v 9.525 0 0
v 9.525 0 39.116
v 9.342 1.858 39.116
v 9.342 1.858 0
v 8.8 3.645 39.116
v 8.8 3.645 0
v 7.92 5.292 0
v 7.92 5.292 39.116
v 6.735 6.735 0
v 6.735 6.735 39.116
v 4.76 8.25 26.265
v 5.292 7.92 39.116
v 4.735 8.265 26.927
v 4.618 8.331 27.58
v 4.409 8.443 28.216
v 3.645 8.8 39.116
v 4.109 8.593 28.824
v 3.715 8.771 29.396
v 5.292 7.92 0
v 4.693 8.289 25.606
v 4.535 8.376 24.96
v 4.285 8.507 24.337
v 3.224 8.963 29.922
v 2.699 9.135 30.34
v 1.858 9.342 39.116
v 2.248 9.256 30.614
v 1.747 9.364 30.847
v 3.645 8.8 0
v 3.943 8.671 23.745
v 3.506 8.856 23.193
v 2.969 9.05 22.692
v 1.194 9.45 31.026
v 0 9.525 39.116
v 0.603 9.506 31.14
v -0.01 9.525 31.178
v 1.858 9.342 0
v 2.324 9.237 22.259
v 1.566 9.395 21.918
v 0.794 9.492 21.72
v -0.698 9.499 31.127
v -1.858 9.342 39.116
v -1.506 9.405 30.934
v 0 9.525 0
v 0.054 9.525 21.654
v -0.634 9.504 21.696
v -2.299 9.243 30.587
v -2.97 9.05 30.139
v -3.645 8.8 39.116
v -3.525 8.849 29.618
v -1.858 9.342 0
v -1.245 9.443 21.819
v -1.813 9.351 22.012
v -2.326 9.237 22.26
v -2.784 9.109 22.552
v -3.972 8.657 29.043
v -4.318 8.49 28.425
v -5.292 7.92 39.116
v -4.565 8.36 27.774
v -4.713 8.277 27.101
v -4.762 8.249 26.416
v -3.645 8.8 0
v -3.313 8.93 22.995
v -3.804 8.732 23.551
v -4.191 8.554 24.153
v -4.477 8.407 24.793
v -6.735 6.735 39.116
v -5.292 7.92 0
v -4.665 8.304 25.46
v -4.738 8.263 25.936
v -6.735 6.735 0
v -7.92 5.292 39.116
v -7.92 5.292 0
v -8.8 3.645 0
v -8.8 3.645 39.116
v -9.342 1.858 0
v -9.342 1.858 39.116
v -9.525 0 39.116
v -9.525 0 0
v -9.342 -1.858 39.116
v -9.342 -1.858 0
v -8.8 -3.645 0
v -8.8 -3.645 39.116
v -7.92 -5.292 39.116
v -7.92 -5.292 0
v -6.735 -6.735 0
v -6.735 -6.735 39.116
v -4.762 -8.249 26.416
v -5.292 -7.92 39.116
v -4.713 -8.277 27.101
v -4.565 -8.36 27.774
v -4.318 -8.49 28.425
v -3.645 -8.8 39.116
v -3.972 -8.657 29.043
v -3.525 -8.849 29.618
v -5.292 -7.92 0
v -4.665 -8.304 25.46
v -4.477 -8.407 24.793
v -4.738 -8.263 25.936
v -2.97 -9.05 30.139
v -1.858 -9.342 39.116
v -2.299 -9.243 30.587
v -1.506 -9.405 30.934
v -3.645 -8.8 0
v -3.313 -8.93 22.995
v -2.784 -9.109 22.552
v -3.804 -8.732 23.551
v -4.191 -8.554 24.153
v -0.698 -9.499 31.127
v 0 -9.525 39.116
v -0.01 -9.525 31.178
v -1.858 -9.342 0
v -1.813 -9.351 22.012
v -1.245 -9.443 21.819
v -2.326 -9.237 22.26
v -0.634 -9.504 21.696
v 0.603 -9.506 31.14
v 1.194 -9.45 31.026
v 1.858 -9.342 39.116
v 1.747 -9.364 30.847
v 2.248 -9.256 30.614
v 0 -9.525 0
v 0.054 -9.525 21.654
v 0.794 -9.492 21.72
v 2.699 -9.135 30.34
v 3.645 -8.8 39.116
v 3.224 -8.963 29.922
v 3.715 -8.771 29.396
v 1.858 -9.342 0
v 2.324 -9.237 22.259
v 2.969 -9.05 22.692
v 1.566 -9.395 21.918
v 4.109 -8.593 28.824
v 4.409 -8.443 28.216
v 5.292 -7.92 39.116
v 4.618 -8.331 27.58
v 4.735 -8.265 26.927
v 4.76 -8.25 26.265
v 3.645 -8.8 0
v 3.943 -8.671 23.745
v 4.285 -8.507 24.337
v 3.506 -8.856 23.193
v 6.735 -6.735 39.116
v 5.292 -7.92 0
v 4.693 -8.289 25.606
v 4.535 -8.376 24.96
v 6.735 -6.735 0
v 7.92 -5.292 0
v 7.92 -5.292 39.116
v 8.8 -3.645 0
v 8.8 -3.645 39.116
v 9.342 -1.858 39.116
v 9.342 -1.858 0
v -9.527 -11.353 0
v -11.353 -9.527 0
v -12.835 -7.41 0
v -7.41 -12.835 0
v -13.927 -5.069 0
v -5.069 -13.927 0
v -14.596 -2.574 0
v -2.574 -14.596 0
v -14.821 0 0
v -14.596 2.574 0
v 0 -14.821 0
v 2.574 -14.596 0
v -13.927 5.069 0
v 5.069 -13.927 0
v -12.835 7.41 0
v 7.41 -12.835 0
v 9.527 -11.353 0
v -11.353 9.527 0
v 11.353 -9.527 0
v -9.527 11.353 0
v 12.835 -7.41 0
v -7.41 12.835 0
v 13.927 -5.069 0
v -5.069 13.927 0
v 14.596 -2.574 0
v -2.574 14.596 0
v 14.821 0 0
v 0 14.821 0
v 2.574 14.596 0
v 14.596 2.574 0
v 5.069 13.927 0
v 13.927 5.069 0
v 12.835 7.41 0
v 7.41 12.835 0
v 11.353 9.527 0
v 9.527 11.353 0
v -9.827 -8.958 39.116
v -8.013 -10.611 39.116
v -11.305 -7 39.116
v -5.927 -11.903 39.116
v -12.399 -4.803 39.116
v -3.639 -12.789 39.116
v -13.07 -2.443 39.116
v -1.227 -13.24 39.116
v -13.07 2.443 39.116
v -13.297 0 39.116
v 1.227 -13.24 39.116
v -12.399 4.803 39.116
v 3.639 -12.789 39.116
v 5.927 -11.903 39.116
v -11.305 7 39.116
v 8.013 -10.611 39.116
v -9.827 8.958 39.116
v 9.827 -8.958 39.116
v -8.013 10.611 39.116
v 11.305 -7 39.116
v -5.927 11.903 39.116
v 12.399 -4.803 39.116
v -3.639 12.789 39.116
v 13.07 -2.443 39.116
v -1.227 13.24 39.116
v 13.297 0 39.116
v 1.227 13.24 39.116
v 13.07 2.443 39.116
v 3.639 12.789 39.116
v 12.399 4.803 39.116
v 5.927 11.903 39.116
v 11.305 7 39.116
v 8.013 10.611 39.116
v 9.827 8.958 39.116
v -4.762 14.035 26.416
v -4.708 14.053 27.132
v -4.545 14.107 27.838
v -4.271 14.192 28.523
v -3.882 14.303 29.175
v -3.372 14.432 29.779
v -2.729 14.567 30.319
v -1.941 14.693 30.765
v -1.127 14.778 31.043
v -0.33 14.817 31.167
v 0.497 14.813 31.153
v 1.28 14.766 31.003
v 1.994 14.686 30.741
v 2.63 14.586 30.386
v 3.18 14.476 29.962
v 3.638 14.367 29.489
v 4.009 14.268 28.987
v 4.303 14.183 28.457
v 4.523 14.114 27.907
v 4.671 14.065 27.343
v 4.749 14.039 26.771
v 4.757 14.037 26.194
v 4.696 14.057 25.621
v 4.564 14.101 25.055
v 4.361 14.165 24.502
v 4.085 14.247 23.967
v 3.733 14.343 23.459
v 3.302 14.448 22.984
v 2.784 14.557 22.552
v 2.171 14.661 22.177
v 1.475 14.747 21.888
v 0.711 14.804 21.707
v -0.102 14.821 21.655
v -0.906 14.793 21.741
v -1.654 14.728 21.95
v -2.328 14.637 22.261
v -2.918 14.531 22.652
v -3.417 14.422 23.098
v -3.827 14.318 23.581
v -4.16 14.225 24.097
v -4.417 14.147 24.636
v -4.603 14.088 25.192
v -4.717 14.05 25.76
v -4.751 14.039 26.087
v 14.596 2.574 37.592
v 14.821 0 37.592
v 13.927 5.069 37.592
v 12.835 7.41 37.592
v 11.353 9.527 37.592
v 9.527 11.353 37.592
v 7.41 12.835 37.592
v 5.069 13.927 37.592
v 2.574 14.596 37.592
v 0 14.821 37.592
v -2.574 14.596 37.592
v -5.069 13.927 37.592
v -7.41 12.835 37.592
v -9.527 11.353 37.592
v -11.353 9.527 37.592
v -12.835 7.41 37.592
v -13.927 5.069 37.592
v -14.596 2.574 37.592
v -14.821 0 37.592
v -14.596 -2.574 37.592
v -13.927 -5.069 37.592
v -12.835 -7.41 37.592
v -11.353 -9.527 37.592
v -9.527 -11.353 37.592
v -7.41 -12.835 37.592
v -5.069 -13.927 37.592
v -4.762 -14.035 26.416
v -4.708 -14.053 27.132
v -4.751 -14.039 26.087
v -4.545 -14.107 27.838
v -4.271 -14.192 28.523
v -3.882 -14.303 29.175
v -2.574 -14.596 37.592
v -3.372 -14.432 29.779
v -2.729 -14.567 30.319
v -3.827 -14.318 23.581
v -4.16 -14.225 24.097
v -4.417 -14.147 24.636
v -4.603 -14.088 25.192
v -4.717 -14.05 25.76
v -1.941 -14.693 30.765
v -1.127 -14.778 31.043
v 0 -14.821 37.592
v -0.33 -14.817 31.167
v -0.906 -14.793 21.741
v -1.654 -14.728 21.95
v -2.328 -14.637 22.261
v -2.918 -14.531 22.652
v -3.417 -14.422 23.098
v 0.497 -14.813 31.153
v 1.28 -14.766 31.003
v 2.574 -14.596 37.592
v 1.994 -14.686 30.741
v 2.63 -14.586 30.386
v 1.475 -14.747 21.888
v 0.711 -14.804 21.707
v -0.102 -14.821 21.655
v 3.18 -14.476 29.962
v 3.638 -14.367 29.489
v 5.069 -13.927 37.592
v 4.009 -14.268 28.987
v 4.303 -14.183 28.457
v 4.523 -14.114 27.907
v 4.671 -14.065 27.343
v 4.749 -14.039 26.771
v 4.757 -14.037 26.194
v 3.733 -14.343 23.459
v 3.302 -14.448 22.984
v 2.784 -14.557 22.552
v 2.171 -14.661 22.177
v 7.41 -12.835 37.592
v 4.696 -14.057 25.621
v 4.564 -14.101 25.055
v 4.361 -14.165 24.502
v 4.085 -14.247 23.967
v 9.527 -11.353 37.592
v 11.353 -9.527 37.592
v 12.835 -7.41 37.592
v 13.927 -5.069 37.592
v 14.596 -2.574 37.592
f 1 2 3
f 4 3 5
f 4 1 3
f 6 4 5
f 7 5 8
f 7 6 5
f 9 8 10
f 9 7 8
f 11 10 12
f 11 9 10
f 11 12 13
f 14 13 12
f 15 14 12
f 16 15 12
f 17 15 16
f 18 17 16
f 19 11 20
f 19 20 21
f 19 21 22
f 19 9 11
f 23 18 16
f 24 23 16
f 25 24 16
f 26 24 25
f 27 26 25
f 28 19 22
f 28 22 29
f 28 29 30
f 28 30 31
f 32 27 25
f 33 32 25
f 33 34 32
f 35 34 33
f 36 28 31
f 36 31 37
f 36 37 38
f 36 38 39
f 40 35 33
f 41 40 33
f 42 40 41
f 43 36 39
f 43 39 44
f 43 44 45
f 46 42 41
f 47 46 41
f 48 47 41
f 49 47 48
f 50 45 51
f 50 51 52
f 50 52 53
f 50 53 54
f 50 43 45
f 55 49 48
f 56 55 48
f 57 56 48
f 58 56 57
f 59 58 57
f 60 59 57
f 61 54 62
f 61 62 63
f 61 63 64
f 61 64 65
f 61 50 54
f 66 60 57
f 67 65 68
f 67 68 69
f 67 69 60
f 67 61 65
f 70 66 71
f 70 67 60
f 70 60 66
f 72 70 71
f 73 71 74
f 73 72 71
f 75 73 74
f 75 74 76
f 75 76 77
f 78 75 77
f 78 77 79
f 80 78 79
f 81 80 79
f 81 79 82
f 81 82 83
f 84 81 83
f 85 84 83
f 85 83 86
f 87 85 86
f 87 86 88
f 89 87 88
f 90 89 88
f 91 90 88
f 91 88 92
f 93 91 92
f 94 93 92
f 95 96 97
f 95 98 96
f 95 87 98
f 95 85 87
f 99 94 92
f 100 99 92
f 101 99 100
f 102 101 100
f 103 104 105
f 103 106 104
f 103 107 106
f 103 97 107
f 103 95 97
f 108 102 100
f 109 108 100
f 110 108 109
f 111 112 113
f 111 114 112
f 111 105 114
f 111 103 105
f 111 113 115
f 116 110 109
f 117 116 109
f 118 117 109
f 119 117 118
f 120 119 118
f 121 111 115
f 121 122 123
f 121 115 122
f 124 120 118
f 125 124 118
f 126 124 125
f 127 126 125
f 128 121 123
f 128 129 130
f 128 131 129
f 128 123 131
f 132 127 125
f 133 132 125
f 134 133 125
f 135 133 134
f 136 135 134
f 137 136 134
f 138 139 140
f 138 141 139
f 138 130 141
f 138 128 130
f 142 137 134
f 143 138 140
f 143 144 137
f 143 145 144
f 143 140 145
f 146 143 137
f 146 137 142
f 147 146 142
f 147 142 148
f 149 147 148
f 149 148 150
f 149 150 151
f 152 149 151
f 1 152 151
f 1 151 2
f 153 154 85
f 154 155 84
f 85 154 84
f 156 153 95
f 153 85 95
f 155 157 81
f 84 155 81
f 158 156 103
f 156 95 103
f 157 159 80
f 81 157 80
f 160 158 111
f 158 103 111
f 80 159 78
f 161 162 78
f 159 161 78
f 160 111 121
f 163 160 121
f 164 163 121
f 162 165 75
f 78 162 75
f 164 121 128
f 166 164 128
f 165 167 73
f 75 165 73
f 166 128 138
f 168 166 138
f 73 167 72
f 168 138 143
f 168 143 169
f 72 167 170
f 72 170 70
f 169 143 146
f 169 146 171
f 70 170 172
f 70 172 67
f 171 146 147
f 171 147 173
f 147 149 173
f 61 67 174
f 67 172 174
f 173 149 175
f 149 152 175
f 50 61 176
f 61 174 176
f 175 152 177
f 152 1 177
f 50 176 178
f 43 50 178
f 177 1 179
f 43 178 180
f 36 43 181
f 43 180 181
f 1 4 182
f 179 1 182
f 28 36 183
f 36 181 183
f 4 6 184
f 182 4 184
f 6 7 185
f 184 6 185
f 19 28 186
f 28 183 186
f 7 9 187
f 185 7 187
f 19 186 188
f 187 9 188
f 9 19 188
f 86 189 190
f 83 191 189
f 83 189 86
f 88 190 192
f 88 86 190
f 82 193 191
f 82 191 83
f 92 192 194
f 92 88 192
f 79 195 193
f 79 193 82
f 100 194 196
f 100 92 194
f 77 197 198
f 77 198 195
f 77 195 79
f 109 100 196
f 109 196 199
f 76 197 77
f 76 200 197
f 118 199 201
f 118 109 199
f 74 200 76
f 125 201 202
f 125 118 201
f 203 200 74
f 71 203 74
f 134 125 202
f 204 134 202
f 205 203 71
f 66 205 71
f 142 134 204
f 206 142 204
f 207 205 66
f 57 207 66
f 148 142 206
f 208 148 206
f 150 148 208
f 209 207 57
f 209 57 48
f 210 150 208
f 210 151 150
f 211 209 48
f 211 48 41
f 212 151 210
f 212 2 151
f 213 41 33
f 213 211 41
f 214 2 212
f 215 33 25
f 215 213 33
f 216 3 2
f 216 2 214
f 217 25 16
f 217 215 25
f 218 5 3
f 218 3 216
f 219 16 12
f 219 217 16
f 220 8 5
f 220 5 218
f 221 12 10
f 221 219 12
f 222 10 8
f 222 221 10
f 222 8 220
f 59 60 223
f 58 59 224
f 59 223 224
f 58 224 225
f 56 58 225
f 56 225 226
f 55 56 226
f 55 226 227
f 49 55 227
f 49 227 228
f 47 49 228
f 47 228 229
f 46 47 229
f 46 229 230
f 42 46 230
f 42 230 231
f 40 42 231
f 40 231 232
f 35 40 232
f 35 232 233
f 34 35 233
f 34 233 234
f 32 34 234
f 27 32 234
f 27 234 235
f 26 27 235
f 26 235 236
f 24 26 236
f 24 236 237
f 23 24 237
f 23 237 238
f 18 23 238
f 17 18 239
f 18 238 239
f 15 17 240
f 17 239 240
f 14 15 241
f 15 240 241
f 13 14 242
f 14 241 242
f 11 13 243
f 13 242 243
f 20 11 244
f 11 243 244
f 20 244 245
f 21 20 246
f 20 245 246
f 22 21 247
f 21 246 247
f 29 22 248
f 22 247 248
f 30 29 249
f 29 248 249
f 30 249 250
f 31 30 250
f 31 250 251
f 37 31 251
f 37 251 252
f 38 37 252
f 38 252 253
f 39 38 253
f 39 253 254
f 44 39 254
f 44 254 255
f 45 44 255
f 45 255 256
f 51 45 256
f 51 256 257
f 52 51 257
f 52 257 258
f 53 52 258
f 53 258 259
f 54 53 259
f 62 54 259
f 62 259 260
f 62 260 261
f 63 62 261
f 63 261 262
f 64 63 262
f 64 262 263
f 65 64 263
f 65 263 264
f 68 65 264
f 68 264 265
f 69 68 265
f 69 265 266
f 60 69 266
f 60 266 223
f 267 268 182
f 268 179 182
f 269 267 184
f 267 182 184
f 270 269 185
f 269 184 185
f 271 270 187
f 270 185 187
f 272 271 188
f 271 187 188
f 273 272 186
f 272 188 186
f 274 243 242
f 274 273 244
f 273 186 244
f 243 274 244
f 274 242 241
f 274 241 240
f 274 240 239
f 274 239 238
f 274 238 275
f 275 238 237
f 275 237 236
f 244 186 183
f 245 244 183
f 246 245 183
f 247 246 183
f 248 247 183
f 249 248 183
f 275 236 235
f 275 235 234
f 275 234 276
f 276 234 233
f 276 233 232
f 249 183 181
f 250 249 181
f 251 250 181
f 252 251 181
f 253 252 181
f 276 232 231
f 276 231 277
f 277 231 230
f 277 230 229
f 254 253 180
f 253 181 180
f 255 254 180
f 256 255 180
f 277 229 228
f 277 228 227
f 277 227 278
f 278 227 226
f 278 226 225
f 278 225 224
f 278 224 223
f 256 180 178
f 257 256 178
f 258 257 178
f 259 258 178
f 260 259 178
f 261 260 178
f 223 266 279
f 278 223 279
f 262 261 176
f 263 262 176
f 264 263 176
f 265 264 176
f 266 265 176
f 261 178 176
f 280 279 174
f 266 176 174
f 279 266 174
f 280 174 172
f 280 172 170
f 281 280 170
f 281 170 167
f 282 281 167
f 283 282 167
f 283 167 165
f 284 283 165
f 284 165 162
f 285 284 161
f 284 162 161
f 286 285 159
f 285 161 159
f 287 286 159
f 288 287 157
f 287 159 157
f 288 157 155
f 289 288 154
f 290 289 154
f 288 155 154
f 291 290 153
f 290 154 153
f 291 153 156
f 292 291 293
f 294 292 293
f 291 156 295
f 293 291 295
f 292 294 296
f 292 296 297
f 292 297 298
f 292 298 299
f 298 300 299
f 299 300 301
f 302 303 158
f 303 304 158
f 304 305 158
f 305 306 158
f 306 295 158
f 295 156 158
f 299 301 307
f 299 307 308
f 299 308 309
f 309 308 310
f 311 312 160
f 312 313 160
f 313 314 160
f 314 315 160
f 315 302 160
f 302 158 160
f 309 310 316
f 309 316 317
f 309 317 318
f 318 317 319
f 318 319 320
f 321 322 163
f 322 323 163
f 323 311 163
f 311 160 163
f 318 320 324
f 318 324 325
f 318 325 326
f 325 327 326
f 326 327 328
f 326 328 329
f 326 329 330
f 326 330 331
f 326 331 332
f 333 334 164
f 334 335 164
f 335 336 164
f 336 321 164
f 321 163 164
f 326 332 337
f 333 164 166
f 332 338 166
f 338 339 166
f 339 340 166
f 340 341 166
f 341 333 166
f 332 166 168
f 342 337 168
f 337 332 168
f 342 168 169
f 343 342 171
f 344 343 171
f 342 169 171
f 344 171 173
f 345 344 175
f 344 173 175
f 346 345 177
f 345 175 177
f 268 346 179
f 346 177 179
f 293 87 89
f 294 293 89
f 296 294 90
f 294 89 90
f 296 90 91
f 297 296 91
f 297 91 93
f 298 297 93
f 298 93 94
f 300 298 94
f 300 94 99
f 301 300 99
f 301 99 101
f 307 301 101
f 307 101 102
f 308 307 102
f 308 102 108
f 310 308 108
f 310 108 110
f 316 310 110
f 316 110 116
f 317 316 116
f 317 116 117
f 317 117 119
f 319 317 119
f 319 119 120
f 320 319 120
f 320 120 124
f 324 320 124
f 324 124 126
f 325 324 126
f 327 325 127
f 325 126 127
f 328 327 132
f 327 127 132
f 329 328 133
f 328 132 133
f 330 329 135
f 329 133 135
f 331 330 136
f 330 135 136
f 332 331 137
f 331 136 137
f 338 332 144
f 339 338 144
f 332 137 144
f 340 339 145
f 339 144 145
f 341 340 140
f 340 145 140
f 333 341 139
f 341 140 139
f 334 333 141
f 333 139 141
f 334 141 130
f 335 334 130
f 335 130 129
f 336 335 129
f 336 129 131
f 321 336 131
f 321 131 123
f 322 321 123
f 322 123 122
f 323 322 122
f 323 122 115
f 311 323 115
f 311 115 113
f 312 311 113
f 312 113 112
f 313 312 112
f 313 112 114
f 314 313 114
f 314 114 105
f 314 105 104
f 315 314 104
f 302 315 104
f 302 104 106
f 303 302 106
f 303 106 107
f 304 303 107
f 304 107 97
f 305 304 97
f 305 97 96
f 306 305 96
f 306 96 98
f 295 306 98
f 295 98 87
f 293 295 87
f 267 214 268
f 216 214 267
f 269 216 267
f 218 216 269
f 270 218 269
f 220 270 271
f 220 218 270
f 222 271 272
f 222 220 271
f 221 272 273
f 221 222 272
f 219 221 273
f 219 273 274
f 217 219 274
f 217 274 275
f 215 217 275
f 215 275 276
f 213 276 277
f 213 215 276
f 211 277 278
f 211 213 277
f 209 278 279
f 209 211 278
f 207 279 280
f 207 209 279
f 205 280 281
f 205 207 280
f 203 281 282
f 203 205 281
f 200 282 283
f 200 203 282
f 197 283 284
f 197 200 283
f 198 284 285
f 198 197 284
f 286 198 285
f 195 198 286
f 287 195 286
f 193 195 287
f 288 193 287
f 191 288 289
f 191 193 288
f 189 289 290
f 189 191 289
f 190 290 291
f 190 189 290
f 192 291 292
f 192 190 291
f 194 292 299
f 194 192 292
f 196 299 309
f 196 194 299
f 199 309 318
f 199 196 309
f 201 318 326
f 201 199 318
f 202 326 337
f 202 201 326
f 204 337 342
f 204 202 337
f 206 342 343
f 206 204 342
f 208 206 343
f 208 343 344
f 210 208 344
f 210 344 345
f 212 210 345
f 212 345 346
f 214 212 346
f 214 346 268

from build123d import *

# Parameters (mm, degrees)
F0_R     = 14.8209
F0_R_2   = 9.525
F1_DEPTH = 39.116
F2_SIZE2 = 1.524
F2_SIZE  = 1.524
F5_D     = 9.525


with BuildPart() as f1:
    # F0 (on Top) → F1 (new body)
    with BuildSketch(Plane.XY):
        Circle(F0_R)
        Circle(F0_R_2, mode=Mode.SUBTRACT)
    extrude(amount=F1_DEPTH)

    # F2
    f2_edges = [f1.edges().sort_by_distance(p)[0] for p in [
        (-14.8209, 0, 39.116),
    ]]
    chamfer(f2_edges, length=F2_SIZE, length2=F2_SIZE2)

    # F5 (through all)
    with Locations(Plane.XZ.offset(14.8209)):
        with Locations((0, 26.416)):
            Hole(F5_D / 2)


solid = f1.part
